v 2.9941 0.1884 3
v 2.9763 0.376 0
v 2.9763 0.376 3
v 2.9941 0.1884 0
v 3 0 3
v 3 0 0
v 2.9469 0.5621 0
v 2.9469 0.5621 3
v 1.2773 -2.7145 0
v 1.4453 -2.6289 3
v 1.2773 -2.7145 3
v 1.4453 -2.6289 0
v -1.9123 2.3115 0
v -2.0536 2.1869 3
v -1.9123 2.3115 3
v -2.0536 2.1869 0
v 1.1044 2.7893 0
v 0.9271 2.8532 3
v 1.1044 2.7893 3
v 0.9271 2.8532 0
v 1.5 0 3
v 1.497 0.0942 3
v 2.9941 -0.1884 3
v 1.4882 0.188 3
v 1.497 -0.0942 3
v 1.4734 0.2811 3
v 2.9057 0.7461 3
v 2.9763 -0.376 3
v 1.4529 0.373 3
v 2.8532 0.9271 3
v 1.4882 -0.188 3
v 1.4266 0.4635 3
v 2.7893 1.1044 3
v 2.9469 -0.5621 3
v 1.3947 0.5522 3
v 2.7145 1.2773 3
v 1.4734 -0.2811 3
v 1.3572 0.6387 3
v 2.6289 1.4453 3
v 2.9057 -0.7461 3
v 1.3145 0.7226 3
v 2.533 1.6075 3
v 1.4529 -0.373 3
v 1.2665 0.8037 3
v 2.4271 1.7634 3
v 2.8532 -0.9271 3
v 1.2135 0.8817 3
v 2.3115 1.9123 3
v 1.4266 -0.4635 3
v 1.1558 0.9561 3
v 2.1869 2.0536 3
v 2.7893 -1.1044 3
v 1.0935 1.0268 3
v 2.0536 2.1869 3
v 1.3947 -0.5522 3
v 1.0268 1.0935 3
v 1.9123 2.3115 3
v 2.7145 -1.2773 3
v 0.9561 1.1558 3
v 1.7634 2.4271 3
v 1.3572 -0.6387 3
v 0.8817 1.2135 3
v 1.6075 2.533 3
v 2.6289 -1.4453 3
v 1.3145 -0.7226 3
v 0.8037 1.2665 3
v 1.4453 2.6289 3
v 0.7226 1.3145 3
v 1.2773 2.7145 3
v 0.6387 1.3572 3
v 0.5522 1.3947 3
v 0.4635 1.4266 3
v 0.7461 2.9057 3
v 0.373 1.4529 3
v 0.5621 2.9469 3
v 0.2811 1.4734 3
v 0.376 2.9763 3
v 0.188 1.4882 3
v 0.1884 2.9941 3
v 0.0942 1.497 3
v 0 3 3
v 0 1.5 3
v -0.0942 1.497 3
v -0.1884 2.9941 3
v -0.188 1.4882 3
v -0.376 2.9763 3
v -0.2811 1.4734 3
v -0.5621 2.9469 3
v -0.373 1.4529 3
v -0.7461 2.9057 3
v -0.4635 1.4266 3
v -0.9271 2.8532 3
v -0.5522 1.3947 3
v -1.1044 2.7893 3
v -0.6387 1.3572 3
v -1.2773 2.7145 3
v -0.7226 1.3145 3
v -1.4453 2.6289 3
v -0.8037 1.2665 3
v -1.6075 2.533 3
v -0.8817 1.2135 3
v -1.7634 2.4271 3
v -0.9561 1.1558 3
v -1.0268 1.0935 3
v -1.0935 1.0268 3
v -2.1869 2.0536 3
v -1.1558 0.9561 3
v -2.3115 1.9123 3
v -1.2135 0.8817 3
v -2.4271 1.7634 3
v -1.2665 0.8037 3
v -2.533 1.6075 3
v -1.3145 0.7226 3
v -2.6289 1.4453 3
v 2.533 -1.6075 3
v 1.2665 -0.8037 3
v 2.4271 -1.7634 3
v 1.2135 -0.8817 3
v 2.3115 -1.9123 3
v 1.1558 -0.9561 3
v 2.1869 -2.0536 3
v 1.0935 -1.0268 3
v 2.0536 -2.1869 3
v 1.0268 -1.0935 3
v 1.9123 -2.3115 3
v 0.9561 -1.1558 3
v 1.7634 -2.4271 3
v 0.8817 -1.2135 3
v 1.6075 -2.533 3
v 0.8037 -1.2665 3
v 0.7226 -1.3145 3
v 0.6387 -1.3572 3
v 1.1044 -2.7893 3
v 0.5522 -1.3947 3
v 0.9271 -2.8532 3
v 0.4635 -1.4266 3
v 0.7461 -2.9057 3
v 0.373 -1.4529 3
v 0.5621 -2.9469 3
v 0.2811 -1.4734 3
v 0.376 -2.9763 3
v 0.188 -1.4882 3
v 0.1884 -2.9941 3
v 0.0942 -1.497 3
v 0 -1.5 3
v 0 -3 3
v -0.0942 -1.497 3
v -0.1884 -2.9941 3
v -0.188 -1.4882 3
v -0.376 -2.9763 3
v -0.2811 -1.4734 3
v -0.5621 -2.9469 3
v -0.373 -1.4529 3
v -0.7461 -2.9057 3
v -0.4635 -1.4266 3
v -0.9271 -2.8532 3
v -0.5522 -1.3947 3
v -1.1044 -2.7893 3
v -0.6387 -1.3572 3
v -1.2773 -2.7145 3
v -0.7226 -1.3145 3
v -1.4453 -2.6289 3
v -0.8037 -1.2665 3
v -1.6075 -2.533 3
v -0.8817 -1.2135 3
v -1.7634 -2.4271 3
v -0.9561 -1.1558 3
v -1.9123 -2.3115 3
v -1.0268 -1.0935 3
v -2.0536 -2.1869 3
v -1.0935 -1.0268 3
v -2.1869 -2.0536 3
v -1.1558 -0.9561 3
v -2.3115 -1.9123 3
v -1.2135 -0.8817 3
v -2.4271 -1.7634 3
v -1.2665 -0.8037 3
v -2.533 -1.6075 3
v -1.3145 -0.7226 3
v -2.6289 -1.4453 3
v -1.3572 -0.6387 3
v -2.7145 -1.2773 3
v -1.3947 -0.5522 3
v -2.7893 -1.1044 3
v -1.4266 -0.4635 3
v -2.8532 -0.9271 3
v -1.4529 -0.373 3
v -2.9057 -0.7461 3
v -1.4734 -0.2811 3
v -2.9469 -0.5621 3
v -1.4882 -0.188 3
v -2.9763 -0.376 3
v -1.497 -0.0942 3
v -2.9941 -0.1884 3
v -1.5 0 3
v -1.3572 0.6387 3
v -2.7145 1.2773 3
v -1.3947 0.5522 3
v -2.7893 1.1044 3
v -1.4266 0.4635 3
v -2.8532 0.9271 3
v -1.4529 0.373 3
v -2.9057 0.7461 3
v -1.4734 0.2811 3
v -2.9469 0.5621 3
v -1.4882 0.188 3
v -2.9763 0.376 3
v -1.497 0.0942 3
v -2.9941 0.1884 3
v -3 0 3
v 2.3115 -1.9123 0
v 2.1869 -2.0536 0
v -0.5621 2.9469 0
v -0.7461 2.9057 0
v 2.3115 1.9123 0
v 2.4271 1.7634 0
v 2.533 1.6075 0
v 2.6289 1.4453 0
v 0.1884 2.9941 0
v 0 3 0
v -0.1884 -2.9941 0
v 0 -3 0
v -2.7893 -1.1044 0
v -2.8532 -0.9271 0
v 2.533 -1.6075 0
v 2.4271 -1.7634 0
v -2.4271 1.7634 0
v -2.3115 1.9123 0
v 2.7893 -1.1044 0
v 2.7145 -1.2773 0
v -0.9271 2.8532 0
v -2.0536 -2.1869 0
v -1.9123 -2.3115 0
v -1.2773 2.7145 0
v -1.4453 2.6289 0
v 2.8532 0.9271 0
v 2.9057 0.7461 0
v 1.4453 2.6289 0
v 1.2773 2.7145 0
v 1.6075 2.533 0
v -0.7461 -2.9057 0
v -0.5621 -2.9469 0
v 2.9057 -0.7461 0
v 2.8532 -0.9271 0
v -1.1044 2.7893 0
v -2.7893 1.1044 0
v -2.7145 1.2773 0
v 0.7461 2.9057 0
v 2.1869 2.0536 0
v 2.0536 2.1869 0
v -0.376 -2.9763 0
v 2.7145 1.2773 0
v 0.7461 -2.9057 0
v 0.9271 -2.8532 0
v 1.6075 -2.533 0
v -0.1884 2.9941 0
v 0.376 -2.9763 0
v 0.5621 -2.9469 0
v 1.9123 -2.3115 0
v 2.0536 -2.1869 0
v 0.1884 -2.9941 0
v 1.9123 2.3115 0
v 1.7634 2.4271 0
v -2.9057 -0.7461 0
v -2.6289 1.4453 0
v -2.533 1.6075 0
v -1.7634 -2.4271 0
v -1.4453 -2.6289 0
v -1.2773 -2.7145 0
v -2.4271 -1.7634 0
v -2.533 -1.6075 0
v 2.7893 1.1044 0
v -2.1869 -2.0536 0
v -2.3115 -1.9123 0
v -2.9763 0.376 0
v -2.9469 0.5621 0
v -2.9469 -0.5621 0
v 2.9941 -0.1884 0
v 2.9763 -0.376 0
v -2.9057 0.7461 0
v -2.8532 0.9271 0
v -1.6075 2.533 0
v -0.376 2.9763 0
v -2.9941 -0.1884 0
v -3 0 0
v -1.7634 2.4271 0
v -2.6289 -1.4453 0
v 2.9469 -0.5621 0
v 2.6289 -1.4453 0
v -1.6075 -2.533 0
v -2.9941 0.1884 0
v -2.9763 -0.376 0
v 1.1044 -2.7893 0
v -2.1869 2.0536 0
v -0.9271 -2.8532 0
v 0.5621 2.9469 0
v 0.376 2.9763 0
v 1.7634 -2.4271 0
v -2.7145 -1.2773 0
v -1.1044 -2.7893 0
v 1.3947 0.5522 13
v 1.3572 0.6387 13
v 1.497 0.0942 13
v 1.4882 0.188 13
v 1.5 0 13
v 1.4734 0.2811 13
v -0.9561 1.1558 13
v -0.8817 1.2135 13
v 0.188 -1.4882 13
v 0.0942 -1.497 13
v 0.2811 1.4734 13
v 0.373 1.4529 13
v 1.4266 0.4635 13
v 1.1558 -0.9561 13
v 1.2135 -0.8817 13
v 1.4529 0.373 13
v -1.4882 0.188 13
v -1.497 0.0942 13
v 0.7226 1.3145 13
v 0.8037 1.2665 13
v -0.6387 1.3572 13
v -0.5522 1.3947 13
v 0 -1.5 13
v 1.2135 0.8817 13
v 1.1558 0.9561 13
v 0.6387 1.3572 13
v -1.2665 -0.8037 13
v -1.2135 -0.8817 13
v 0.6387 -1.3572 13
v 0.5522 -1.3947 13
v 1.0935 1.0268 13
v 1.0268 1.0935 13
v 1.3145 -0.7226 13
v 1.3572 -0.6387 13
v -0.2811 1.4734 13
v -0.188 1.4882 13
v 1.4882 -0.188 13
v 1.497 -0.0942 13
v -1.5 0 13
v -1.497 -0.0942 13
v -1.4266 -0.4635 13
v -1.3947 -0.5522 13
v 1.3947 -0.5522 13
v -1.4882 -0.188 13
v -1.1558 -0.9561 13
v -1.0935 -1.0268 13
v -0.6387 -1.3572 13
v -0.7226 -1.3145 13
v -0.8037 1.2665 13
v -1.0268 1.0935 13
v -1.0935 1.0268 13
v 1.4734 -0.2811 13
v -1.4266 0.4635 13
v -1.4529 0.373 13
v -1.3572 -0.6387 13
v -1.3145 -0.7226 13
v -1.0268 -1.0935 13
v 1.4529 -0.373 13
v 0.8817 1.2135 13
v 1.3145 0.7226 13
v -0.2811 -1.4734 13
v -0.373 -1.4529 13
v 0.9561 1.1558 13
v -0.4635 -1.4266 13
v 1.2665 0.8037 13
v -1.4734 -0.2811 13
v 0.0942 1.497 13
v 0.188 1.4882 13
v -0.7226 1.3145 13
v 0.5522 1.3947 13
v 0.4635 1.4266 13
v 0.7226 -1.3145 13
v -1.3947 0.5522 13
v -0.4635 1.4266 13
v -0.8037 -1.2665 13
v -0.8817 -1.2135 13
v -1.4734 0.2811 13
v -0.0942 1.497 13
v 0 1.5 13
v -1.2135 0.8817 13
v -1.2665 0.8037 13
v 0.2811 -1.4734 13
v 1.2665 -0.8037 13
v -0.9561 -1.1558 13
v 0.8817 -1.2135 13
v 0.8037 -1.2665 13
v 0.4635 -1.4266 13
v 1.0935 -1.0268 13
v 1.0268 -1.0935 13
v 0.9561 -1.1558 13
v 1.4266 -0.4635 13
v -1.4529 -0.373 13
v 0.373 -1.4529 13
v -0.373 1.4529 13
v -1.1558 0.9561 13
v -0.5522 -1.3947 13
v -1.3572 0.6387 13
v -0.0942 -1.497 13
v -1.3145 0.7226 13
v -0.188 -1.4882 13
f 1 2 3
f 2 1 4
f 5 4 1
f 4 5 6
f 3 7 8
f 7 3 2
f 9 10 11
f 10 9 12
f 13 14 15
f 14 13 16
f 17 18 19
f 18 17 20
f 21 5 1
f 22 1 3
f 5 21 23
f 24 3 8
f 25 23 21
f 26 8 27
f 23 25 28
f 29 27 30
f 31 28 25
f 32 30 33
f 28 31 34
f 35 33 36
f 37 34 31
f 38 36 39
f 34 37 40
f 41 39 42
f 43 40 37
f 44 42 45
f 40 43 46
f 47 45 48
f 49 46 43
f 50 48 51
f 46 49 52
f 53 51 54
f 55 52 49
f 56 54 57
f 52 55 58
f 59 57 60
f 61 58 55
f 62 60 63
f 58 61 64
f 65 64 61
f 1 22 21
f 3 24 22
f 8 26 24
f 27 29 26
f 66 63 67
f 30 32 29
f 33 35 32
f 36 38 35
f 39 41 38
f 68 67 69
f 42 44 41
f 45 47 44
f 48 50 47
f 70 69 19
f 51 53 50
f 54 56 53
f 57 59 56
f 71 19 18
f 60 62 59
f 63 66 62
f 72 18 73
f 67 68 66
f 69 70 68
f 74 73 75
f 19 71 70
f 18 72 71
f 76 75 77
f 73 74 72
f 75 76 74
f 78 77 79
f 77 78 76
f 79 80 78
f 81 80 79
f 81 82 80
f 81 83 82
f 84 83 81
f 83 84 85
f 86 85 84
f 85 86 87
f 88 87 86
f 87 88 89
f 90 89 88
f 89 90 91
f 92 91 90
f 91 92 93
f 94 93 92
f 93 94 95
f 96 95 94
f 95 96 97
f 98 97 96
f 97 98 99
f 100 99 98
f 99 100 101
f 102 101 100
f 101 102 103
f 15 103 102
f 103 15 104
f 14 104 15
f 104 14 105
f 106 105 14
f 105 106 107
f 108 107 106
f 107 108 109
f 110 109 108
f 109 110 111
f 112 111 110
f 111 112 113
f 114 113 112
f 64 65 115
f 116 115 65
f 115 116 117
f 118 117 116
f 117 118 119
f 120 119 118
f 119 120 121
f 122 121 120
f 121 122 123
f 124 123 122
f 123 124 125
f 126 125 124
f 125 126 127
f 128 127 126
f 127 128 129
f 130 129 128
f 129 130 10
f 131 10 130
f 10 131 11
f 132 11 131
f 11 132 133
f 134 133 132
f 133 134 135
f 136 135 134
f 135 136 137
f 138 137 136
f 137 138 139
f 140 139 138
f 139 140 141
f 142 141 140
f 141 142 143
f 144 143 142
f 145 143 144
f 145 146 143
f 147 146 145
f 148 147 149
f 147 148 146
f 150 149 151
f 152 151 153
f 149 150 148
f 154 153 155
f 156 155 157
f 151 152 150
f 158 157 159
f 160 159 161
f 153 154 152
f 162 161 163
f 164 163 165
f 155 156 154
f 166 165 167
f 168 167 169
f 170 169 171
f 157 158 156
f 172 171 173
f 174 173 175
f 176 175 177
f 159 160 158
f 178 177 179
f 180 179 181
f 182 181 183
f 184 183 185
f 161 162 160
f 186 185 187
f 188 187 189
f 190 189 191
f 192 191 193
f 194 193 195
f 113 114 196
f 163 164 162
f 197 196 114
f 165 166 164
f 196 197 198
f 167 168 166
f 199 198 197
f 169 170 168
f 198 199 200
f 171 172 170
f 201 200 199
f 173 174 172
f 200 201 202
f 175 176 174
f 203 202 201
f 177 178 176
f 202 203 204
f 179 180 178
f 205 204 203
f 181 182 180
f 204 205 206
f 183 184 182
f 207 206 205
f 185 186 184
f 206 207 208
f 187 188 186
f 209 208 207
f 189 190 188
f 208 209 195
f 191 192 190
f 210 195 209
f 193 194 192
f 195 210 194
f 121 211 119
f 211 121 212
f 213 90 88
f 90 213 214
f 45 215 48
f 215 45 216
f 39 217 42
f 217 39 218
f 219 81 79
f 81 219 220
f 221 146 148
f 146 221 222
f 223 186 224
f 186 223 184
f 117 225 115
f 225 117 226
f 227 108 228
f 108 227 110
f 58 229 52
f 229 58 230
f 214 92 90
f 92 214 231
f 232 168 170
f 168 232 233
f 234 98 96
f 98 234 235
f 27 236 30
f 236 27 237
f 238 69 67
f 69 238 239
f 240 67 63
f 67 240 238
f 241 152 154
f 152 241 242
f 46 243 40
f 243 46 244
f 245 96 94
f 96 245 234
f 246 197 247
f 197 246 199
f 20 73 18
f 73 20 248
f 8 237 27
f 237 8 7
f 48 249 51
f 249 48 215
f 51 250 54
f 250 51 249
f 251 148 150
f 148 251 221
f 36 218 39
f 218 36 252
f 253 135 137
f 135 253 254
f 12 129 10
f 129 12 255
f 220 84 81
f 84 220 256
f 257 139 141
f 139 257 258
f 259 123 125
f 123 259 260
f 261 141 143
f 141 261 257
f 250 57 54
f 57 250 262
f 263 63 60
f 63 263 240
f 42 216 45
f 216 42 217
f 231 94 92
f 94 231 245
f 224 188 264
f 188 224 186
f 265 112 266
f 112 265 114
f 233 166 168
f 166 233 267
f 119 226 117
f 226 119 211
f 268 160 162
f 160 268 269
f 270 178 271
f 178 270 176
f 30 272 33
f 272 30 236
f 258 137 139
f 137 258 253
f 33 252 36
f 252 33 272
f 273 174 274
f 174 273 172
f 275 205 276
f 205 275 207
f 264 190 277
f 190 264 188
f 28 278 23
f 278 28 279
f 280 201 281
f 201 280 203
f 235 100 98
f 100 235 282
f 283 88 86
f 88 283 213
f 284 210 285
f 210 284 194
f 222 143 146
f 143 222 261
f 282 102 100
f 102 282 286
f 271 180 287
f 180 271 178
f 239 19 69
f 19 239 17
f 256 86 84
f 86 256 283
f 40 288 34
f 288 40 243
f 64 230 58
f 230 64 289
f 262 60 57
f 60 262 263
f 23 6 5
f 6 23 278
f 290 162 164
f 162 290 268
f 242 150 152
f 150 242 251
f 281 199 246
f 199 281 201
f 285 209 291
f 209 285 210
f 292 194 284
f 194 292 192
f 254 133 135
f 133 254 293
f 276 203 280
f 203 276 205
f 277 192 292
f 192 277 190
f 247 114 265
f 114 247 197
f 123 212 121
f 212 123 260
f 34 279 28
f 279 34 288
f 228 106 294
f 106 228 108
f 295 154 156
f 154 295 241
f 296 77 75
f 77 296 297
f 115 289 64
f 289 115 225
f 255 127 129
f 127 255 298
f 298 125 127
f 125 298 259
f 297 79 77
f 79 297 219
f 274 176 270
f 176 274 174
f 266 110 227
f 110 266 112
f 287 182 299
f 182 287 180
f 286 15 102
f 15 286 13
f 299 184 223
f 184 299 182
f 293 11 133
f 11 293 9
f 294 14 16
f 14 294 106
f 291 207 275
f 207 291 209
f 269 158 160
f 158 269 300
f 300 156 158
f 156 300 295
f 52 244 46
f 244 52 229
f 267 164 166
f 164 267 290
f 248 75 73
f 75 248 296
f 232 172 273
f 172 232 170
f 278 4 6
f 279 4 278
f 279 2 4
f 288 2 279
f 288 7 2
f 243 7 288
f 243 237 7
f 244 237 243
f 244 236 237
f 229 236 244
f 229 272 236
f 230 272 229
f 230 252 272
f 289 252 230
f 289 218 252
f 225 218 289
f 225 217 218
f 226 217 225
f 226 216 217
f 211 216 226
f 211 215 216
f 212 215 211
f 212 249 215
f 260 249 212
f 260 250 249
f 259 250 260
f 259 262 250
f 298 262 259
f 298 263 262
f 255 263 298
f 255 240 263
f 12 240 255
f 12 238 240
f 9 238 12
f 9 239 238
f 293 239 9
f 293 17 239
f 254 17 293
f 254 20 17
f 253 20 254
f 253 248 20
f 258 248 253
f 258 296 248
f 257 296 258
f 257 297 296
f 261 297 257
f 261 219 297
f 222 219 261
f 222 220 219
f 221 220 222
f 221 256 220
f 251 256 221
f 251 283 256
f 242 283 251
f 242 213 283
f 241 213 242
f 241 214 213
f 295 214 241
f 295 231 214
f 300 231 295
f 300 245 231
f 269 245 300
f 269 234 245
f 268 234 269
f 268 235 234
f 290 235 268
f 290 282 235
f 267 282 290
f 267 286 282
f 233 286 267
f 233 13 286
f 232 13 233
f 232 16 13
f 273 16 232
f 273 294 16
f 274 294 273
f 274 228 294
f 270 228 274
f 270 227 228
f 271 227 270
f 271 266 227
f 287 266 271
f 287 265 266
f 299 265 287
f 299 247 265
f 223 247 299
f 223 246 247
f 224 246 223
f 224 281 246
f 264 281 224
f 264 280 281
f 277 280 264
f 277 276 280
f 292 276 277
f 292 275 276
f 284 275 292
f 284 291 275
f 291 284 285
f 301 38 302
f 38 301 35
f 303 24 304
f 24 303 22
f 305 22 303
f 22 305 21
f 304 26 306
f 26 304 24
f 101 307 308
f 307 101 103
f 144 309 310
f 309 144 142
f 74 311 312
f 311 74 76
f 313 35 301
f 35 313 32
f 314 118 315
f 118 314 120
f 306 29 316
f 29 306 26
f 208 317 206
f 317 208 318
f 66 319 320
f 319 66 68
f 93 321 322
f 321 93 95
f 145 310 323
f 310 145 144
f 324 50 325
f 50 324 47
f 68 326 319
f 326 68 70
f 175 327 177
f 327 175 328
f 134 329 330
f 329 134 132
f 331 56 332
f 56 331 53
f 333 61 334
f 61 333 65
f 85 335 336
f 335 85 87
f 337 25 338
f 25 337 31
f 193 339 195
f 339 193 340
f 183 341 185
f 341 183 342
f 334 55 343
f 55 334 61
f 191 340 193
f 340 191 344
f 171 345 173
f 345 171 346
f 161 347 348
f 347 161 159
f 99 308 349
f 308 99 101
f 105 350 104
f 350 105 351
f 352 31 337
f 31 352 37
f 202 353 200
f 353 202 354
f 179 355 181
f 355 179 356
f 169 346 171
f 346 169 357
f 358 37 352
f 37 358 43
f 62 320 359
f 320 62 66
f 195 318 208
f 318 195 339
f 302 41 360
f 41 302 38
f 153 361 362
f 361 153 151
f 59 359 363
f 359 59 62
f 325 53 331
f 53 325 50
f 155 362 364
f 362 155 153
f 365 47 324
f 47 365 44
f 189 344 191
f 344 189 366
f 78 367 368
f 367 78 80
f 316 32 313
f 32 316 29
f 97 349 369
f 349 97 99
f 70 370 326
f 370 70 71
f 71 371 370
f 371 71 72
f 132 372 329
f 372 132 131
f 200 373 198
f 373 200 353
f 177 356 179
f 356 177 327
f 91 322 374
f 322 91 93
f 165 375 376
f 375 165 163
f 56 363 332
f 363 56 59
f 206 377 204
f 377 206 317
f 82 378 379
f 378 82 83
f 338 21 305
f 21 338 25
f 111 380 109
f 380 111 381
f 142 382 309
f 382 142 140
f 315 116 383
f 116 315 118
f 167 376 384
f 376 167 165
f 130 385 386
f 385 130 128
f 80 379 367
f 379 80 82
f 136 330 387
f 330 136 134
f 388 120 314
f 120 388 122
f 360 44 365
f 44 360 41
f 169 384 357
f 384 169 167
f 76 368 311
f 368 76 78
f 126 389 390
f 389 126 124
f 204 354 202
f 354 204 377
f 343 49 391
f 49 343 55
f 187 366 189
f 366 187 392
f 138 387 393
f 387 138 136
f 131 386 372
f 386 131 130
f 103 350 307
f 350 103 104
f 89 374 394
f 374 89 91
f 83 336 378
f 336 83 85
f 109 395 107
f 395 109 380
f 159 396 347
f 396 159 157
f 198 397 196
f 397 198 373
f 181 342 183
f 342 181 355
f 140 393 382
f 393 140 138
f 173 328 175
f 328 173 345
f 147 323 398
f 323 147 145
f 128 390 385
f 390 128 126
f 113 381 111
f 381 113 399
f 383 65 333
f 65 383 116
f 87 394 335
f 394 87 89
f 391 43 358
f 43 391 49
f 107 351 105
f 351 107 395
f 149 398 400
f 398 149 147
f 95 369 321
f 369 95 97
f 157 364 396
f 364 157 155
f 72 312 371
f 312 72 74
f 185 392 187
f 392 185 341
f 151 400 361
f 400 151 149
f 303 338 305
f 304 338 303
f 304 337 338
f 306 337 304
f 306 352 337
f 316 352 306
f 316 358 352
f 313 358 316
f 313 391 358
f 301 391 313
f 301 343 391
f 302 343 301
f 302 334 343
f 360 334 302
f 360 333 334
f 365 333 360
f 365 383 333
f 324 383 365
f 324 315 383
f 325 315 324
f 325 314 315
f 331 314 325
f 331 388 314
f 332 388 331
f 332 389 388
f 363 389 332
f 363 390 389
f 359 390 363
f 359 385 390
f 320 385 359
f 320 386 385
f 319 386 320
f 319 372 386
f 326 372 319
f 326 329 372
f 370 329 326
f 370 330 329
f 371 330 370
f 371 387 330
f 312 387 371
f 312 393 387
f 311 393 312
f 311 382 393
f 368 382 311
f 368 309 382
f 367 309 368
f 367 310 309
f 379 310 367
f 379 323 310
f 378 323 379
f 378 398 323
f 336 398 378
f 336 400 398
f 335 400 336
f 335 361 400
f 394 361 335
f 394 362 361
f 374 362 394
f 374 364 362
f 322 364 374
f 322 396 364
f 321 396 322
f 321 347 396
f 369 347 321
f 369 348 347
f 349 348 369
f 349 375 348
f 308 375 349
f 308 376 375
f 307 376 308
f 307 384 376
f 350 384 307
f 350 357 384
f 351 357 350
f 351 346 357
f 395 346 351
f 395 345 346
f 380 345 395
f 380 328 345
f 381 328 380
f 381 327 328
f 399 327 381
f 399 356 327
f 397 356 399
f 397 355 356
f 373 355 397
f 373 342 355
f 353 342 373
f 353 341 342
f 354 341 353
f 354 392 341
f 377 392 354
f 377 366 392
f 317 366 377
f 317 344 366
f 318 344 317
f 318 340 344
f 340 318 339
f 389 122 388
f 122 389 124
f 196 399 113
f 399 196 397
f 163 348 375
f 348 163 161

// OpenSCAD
$fn=100;

module screw(screw_head_radius=3, screw_head_height=3, threaded_radius=1.5, threaded_height=10) {
  // screw head
  cylinder(h=screw_head_height, r=screw_head_radius);

  translate([0, 0, screw_head_height]) {
    cylinder(h=threaded_height, r=threaded_radius);
  }
}

// m3x10

screw(screw_head_radius=3, screw_head_height=3, threaded_radius=1.5, threaded_height=10);
